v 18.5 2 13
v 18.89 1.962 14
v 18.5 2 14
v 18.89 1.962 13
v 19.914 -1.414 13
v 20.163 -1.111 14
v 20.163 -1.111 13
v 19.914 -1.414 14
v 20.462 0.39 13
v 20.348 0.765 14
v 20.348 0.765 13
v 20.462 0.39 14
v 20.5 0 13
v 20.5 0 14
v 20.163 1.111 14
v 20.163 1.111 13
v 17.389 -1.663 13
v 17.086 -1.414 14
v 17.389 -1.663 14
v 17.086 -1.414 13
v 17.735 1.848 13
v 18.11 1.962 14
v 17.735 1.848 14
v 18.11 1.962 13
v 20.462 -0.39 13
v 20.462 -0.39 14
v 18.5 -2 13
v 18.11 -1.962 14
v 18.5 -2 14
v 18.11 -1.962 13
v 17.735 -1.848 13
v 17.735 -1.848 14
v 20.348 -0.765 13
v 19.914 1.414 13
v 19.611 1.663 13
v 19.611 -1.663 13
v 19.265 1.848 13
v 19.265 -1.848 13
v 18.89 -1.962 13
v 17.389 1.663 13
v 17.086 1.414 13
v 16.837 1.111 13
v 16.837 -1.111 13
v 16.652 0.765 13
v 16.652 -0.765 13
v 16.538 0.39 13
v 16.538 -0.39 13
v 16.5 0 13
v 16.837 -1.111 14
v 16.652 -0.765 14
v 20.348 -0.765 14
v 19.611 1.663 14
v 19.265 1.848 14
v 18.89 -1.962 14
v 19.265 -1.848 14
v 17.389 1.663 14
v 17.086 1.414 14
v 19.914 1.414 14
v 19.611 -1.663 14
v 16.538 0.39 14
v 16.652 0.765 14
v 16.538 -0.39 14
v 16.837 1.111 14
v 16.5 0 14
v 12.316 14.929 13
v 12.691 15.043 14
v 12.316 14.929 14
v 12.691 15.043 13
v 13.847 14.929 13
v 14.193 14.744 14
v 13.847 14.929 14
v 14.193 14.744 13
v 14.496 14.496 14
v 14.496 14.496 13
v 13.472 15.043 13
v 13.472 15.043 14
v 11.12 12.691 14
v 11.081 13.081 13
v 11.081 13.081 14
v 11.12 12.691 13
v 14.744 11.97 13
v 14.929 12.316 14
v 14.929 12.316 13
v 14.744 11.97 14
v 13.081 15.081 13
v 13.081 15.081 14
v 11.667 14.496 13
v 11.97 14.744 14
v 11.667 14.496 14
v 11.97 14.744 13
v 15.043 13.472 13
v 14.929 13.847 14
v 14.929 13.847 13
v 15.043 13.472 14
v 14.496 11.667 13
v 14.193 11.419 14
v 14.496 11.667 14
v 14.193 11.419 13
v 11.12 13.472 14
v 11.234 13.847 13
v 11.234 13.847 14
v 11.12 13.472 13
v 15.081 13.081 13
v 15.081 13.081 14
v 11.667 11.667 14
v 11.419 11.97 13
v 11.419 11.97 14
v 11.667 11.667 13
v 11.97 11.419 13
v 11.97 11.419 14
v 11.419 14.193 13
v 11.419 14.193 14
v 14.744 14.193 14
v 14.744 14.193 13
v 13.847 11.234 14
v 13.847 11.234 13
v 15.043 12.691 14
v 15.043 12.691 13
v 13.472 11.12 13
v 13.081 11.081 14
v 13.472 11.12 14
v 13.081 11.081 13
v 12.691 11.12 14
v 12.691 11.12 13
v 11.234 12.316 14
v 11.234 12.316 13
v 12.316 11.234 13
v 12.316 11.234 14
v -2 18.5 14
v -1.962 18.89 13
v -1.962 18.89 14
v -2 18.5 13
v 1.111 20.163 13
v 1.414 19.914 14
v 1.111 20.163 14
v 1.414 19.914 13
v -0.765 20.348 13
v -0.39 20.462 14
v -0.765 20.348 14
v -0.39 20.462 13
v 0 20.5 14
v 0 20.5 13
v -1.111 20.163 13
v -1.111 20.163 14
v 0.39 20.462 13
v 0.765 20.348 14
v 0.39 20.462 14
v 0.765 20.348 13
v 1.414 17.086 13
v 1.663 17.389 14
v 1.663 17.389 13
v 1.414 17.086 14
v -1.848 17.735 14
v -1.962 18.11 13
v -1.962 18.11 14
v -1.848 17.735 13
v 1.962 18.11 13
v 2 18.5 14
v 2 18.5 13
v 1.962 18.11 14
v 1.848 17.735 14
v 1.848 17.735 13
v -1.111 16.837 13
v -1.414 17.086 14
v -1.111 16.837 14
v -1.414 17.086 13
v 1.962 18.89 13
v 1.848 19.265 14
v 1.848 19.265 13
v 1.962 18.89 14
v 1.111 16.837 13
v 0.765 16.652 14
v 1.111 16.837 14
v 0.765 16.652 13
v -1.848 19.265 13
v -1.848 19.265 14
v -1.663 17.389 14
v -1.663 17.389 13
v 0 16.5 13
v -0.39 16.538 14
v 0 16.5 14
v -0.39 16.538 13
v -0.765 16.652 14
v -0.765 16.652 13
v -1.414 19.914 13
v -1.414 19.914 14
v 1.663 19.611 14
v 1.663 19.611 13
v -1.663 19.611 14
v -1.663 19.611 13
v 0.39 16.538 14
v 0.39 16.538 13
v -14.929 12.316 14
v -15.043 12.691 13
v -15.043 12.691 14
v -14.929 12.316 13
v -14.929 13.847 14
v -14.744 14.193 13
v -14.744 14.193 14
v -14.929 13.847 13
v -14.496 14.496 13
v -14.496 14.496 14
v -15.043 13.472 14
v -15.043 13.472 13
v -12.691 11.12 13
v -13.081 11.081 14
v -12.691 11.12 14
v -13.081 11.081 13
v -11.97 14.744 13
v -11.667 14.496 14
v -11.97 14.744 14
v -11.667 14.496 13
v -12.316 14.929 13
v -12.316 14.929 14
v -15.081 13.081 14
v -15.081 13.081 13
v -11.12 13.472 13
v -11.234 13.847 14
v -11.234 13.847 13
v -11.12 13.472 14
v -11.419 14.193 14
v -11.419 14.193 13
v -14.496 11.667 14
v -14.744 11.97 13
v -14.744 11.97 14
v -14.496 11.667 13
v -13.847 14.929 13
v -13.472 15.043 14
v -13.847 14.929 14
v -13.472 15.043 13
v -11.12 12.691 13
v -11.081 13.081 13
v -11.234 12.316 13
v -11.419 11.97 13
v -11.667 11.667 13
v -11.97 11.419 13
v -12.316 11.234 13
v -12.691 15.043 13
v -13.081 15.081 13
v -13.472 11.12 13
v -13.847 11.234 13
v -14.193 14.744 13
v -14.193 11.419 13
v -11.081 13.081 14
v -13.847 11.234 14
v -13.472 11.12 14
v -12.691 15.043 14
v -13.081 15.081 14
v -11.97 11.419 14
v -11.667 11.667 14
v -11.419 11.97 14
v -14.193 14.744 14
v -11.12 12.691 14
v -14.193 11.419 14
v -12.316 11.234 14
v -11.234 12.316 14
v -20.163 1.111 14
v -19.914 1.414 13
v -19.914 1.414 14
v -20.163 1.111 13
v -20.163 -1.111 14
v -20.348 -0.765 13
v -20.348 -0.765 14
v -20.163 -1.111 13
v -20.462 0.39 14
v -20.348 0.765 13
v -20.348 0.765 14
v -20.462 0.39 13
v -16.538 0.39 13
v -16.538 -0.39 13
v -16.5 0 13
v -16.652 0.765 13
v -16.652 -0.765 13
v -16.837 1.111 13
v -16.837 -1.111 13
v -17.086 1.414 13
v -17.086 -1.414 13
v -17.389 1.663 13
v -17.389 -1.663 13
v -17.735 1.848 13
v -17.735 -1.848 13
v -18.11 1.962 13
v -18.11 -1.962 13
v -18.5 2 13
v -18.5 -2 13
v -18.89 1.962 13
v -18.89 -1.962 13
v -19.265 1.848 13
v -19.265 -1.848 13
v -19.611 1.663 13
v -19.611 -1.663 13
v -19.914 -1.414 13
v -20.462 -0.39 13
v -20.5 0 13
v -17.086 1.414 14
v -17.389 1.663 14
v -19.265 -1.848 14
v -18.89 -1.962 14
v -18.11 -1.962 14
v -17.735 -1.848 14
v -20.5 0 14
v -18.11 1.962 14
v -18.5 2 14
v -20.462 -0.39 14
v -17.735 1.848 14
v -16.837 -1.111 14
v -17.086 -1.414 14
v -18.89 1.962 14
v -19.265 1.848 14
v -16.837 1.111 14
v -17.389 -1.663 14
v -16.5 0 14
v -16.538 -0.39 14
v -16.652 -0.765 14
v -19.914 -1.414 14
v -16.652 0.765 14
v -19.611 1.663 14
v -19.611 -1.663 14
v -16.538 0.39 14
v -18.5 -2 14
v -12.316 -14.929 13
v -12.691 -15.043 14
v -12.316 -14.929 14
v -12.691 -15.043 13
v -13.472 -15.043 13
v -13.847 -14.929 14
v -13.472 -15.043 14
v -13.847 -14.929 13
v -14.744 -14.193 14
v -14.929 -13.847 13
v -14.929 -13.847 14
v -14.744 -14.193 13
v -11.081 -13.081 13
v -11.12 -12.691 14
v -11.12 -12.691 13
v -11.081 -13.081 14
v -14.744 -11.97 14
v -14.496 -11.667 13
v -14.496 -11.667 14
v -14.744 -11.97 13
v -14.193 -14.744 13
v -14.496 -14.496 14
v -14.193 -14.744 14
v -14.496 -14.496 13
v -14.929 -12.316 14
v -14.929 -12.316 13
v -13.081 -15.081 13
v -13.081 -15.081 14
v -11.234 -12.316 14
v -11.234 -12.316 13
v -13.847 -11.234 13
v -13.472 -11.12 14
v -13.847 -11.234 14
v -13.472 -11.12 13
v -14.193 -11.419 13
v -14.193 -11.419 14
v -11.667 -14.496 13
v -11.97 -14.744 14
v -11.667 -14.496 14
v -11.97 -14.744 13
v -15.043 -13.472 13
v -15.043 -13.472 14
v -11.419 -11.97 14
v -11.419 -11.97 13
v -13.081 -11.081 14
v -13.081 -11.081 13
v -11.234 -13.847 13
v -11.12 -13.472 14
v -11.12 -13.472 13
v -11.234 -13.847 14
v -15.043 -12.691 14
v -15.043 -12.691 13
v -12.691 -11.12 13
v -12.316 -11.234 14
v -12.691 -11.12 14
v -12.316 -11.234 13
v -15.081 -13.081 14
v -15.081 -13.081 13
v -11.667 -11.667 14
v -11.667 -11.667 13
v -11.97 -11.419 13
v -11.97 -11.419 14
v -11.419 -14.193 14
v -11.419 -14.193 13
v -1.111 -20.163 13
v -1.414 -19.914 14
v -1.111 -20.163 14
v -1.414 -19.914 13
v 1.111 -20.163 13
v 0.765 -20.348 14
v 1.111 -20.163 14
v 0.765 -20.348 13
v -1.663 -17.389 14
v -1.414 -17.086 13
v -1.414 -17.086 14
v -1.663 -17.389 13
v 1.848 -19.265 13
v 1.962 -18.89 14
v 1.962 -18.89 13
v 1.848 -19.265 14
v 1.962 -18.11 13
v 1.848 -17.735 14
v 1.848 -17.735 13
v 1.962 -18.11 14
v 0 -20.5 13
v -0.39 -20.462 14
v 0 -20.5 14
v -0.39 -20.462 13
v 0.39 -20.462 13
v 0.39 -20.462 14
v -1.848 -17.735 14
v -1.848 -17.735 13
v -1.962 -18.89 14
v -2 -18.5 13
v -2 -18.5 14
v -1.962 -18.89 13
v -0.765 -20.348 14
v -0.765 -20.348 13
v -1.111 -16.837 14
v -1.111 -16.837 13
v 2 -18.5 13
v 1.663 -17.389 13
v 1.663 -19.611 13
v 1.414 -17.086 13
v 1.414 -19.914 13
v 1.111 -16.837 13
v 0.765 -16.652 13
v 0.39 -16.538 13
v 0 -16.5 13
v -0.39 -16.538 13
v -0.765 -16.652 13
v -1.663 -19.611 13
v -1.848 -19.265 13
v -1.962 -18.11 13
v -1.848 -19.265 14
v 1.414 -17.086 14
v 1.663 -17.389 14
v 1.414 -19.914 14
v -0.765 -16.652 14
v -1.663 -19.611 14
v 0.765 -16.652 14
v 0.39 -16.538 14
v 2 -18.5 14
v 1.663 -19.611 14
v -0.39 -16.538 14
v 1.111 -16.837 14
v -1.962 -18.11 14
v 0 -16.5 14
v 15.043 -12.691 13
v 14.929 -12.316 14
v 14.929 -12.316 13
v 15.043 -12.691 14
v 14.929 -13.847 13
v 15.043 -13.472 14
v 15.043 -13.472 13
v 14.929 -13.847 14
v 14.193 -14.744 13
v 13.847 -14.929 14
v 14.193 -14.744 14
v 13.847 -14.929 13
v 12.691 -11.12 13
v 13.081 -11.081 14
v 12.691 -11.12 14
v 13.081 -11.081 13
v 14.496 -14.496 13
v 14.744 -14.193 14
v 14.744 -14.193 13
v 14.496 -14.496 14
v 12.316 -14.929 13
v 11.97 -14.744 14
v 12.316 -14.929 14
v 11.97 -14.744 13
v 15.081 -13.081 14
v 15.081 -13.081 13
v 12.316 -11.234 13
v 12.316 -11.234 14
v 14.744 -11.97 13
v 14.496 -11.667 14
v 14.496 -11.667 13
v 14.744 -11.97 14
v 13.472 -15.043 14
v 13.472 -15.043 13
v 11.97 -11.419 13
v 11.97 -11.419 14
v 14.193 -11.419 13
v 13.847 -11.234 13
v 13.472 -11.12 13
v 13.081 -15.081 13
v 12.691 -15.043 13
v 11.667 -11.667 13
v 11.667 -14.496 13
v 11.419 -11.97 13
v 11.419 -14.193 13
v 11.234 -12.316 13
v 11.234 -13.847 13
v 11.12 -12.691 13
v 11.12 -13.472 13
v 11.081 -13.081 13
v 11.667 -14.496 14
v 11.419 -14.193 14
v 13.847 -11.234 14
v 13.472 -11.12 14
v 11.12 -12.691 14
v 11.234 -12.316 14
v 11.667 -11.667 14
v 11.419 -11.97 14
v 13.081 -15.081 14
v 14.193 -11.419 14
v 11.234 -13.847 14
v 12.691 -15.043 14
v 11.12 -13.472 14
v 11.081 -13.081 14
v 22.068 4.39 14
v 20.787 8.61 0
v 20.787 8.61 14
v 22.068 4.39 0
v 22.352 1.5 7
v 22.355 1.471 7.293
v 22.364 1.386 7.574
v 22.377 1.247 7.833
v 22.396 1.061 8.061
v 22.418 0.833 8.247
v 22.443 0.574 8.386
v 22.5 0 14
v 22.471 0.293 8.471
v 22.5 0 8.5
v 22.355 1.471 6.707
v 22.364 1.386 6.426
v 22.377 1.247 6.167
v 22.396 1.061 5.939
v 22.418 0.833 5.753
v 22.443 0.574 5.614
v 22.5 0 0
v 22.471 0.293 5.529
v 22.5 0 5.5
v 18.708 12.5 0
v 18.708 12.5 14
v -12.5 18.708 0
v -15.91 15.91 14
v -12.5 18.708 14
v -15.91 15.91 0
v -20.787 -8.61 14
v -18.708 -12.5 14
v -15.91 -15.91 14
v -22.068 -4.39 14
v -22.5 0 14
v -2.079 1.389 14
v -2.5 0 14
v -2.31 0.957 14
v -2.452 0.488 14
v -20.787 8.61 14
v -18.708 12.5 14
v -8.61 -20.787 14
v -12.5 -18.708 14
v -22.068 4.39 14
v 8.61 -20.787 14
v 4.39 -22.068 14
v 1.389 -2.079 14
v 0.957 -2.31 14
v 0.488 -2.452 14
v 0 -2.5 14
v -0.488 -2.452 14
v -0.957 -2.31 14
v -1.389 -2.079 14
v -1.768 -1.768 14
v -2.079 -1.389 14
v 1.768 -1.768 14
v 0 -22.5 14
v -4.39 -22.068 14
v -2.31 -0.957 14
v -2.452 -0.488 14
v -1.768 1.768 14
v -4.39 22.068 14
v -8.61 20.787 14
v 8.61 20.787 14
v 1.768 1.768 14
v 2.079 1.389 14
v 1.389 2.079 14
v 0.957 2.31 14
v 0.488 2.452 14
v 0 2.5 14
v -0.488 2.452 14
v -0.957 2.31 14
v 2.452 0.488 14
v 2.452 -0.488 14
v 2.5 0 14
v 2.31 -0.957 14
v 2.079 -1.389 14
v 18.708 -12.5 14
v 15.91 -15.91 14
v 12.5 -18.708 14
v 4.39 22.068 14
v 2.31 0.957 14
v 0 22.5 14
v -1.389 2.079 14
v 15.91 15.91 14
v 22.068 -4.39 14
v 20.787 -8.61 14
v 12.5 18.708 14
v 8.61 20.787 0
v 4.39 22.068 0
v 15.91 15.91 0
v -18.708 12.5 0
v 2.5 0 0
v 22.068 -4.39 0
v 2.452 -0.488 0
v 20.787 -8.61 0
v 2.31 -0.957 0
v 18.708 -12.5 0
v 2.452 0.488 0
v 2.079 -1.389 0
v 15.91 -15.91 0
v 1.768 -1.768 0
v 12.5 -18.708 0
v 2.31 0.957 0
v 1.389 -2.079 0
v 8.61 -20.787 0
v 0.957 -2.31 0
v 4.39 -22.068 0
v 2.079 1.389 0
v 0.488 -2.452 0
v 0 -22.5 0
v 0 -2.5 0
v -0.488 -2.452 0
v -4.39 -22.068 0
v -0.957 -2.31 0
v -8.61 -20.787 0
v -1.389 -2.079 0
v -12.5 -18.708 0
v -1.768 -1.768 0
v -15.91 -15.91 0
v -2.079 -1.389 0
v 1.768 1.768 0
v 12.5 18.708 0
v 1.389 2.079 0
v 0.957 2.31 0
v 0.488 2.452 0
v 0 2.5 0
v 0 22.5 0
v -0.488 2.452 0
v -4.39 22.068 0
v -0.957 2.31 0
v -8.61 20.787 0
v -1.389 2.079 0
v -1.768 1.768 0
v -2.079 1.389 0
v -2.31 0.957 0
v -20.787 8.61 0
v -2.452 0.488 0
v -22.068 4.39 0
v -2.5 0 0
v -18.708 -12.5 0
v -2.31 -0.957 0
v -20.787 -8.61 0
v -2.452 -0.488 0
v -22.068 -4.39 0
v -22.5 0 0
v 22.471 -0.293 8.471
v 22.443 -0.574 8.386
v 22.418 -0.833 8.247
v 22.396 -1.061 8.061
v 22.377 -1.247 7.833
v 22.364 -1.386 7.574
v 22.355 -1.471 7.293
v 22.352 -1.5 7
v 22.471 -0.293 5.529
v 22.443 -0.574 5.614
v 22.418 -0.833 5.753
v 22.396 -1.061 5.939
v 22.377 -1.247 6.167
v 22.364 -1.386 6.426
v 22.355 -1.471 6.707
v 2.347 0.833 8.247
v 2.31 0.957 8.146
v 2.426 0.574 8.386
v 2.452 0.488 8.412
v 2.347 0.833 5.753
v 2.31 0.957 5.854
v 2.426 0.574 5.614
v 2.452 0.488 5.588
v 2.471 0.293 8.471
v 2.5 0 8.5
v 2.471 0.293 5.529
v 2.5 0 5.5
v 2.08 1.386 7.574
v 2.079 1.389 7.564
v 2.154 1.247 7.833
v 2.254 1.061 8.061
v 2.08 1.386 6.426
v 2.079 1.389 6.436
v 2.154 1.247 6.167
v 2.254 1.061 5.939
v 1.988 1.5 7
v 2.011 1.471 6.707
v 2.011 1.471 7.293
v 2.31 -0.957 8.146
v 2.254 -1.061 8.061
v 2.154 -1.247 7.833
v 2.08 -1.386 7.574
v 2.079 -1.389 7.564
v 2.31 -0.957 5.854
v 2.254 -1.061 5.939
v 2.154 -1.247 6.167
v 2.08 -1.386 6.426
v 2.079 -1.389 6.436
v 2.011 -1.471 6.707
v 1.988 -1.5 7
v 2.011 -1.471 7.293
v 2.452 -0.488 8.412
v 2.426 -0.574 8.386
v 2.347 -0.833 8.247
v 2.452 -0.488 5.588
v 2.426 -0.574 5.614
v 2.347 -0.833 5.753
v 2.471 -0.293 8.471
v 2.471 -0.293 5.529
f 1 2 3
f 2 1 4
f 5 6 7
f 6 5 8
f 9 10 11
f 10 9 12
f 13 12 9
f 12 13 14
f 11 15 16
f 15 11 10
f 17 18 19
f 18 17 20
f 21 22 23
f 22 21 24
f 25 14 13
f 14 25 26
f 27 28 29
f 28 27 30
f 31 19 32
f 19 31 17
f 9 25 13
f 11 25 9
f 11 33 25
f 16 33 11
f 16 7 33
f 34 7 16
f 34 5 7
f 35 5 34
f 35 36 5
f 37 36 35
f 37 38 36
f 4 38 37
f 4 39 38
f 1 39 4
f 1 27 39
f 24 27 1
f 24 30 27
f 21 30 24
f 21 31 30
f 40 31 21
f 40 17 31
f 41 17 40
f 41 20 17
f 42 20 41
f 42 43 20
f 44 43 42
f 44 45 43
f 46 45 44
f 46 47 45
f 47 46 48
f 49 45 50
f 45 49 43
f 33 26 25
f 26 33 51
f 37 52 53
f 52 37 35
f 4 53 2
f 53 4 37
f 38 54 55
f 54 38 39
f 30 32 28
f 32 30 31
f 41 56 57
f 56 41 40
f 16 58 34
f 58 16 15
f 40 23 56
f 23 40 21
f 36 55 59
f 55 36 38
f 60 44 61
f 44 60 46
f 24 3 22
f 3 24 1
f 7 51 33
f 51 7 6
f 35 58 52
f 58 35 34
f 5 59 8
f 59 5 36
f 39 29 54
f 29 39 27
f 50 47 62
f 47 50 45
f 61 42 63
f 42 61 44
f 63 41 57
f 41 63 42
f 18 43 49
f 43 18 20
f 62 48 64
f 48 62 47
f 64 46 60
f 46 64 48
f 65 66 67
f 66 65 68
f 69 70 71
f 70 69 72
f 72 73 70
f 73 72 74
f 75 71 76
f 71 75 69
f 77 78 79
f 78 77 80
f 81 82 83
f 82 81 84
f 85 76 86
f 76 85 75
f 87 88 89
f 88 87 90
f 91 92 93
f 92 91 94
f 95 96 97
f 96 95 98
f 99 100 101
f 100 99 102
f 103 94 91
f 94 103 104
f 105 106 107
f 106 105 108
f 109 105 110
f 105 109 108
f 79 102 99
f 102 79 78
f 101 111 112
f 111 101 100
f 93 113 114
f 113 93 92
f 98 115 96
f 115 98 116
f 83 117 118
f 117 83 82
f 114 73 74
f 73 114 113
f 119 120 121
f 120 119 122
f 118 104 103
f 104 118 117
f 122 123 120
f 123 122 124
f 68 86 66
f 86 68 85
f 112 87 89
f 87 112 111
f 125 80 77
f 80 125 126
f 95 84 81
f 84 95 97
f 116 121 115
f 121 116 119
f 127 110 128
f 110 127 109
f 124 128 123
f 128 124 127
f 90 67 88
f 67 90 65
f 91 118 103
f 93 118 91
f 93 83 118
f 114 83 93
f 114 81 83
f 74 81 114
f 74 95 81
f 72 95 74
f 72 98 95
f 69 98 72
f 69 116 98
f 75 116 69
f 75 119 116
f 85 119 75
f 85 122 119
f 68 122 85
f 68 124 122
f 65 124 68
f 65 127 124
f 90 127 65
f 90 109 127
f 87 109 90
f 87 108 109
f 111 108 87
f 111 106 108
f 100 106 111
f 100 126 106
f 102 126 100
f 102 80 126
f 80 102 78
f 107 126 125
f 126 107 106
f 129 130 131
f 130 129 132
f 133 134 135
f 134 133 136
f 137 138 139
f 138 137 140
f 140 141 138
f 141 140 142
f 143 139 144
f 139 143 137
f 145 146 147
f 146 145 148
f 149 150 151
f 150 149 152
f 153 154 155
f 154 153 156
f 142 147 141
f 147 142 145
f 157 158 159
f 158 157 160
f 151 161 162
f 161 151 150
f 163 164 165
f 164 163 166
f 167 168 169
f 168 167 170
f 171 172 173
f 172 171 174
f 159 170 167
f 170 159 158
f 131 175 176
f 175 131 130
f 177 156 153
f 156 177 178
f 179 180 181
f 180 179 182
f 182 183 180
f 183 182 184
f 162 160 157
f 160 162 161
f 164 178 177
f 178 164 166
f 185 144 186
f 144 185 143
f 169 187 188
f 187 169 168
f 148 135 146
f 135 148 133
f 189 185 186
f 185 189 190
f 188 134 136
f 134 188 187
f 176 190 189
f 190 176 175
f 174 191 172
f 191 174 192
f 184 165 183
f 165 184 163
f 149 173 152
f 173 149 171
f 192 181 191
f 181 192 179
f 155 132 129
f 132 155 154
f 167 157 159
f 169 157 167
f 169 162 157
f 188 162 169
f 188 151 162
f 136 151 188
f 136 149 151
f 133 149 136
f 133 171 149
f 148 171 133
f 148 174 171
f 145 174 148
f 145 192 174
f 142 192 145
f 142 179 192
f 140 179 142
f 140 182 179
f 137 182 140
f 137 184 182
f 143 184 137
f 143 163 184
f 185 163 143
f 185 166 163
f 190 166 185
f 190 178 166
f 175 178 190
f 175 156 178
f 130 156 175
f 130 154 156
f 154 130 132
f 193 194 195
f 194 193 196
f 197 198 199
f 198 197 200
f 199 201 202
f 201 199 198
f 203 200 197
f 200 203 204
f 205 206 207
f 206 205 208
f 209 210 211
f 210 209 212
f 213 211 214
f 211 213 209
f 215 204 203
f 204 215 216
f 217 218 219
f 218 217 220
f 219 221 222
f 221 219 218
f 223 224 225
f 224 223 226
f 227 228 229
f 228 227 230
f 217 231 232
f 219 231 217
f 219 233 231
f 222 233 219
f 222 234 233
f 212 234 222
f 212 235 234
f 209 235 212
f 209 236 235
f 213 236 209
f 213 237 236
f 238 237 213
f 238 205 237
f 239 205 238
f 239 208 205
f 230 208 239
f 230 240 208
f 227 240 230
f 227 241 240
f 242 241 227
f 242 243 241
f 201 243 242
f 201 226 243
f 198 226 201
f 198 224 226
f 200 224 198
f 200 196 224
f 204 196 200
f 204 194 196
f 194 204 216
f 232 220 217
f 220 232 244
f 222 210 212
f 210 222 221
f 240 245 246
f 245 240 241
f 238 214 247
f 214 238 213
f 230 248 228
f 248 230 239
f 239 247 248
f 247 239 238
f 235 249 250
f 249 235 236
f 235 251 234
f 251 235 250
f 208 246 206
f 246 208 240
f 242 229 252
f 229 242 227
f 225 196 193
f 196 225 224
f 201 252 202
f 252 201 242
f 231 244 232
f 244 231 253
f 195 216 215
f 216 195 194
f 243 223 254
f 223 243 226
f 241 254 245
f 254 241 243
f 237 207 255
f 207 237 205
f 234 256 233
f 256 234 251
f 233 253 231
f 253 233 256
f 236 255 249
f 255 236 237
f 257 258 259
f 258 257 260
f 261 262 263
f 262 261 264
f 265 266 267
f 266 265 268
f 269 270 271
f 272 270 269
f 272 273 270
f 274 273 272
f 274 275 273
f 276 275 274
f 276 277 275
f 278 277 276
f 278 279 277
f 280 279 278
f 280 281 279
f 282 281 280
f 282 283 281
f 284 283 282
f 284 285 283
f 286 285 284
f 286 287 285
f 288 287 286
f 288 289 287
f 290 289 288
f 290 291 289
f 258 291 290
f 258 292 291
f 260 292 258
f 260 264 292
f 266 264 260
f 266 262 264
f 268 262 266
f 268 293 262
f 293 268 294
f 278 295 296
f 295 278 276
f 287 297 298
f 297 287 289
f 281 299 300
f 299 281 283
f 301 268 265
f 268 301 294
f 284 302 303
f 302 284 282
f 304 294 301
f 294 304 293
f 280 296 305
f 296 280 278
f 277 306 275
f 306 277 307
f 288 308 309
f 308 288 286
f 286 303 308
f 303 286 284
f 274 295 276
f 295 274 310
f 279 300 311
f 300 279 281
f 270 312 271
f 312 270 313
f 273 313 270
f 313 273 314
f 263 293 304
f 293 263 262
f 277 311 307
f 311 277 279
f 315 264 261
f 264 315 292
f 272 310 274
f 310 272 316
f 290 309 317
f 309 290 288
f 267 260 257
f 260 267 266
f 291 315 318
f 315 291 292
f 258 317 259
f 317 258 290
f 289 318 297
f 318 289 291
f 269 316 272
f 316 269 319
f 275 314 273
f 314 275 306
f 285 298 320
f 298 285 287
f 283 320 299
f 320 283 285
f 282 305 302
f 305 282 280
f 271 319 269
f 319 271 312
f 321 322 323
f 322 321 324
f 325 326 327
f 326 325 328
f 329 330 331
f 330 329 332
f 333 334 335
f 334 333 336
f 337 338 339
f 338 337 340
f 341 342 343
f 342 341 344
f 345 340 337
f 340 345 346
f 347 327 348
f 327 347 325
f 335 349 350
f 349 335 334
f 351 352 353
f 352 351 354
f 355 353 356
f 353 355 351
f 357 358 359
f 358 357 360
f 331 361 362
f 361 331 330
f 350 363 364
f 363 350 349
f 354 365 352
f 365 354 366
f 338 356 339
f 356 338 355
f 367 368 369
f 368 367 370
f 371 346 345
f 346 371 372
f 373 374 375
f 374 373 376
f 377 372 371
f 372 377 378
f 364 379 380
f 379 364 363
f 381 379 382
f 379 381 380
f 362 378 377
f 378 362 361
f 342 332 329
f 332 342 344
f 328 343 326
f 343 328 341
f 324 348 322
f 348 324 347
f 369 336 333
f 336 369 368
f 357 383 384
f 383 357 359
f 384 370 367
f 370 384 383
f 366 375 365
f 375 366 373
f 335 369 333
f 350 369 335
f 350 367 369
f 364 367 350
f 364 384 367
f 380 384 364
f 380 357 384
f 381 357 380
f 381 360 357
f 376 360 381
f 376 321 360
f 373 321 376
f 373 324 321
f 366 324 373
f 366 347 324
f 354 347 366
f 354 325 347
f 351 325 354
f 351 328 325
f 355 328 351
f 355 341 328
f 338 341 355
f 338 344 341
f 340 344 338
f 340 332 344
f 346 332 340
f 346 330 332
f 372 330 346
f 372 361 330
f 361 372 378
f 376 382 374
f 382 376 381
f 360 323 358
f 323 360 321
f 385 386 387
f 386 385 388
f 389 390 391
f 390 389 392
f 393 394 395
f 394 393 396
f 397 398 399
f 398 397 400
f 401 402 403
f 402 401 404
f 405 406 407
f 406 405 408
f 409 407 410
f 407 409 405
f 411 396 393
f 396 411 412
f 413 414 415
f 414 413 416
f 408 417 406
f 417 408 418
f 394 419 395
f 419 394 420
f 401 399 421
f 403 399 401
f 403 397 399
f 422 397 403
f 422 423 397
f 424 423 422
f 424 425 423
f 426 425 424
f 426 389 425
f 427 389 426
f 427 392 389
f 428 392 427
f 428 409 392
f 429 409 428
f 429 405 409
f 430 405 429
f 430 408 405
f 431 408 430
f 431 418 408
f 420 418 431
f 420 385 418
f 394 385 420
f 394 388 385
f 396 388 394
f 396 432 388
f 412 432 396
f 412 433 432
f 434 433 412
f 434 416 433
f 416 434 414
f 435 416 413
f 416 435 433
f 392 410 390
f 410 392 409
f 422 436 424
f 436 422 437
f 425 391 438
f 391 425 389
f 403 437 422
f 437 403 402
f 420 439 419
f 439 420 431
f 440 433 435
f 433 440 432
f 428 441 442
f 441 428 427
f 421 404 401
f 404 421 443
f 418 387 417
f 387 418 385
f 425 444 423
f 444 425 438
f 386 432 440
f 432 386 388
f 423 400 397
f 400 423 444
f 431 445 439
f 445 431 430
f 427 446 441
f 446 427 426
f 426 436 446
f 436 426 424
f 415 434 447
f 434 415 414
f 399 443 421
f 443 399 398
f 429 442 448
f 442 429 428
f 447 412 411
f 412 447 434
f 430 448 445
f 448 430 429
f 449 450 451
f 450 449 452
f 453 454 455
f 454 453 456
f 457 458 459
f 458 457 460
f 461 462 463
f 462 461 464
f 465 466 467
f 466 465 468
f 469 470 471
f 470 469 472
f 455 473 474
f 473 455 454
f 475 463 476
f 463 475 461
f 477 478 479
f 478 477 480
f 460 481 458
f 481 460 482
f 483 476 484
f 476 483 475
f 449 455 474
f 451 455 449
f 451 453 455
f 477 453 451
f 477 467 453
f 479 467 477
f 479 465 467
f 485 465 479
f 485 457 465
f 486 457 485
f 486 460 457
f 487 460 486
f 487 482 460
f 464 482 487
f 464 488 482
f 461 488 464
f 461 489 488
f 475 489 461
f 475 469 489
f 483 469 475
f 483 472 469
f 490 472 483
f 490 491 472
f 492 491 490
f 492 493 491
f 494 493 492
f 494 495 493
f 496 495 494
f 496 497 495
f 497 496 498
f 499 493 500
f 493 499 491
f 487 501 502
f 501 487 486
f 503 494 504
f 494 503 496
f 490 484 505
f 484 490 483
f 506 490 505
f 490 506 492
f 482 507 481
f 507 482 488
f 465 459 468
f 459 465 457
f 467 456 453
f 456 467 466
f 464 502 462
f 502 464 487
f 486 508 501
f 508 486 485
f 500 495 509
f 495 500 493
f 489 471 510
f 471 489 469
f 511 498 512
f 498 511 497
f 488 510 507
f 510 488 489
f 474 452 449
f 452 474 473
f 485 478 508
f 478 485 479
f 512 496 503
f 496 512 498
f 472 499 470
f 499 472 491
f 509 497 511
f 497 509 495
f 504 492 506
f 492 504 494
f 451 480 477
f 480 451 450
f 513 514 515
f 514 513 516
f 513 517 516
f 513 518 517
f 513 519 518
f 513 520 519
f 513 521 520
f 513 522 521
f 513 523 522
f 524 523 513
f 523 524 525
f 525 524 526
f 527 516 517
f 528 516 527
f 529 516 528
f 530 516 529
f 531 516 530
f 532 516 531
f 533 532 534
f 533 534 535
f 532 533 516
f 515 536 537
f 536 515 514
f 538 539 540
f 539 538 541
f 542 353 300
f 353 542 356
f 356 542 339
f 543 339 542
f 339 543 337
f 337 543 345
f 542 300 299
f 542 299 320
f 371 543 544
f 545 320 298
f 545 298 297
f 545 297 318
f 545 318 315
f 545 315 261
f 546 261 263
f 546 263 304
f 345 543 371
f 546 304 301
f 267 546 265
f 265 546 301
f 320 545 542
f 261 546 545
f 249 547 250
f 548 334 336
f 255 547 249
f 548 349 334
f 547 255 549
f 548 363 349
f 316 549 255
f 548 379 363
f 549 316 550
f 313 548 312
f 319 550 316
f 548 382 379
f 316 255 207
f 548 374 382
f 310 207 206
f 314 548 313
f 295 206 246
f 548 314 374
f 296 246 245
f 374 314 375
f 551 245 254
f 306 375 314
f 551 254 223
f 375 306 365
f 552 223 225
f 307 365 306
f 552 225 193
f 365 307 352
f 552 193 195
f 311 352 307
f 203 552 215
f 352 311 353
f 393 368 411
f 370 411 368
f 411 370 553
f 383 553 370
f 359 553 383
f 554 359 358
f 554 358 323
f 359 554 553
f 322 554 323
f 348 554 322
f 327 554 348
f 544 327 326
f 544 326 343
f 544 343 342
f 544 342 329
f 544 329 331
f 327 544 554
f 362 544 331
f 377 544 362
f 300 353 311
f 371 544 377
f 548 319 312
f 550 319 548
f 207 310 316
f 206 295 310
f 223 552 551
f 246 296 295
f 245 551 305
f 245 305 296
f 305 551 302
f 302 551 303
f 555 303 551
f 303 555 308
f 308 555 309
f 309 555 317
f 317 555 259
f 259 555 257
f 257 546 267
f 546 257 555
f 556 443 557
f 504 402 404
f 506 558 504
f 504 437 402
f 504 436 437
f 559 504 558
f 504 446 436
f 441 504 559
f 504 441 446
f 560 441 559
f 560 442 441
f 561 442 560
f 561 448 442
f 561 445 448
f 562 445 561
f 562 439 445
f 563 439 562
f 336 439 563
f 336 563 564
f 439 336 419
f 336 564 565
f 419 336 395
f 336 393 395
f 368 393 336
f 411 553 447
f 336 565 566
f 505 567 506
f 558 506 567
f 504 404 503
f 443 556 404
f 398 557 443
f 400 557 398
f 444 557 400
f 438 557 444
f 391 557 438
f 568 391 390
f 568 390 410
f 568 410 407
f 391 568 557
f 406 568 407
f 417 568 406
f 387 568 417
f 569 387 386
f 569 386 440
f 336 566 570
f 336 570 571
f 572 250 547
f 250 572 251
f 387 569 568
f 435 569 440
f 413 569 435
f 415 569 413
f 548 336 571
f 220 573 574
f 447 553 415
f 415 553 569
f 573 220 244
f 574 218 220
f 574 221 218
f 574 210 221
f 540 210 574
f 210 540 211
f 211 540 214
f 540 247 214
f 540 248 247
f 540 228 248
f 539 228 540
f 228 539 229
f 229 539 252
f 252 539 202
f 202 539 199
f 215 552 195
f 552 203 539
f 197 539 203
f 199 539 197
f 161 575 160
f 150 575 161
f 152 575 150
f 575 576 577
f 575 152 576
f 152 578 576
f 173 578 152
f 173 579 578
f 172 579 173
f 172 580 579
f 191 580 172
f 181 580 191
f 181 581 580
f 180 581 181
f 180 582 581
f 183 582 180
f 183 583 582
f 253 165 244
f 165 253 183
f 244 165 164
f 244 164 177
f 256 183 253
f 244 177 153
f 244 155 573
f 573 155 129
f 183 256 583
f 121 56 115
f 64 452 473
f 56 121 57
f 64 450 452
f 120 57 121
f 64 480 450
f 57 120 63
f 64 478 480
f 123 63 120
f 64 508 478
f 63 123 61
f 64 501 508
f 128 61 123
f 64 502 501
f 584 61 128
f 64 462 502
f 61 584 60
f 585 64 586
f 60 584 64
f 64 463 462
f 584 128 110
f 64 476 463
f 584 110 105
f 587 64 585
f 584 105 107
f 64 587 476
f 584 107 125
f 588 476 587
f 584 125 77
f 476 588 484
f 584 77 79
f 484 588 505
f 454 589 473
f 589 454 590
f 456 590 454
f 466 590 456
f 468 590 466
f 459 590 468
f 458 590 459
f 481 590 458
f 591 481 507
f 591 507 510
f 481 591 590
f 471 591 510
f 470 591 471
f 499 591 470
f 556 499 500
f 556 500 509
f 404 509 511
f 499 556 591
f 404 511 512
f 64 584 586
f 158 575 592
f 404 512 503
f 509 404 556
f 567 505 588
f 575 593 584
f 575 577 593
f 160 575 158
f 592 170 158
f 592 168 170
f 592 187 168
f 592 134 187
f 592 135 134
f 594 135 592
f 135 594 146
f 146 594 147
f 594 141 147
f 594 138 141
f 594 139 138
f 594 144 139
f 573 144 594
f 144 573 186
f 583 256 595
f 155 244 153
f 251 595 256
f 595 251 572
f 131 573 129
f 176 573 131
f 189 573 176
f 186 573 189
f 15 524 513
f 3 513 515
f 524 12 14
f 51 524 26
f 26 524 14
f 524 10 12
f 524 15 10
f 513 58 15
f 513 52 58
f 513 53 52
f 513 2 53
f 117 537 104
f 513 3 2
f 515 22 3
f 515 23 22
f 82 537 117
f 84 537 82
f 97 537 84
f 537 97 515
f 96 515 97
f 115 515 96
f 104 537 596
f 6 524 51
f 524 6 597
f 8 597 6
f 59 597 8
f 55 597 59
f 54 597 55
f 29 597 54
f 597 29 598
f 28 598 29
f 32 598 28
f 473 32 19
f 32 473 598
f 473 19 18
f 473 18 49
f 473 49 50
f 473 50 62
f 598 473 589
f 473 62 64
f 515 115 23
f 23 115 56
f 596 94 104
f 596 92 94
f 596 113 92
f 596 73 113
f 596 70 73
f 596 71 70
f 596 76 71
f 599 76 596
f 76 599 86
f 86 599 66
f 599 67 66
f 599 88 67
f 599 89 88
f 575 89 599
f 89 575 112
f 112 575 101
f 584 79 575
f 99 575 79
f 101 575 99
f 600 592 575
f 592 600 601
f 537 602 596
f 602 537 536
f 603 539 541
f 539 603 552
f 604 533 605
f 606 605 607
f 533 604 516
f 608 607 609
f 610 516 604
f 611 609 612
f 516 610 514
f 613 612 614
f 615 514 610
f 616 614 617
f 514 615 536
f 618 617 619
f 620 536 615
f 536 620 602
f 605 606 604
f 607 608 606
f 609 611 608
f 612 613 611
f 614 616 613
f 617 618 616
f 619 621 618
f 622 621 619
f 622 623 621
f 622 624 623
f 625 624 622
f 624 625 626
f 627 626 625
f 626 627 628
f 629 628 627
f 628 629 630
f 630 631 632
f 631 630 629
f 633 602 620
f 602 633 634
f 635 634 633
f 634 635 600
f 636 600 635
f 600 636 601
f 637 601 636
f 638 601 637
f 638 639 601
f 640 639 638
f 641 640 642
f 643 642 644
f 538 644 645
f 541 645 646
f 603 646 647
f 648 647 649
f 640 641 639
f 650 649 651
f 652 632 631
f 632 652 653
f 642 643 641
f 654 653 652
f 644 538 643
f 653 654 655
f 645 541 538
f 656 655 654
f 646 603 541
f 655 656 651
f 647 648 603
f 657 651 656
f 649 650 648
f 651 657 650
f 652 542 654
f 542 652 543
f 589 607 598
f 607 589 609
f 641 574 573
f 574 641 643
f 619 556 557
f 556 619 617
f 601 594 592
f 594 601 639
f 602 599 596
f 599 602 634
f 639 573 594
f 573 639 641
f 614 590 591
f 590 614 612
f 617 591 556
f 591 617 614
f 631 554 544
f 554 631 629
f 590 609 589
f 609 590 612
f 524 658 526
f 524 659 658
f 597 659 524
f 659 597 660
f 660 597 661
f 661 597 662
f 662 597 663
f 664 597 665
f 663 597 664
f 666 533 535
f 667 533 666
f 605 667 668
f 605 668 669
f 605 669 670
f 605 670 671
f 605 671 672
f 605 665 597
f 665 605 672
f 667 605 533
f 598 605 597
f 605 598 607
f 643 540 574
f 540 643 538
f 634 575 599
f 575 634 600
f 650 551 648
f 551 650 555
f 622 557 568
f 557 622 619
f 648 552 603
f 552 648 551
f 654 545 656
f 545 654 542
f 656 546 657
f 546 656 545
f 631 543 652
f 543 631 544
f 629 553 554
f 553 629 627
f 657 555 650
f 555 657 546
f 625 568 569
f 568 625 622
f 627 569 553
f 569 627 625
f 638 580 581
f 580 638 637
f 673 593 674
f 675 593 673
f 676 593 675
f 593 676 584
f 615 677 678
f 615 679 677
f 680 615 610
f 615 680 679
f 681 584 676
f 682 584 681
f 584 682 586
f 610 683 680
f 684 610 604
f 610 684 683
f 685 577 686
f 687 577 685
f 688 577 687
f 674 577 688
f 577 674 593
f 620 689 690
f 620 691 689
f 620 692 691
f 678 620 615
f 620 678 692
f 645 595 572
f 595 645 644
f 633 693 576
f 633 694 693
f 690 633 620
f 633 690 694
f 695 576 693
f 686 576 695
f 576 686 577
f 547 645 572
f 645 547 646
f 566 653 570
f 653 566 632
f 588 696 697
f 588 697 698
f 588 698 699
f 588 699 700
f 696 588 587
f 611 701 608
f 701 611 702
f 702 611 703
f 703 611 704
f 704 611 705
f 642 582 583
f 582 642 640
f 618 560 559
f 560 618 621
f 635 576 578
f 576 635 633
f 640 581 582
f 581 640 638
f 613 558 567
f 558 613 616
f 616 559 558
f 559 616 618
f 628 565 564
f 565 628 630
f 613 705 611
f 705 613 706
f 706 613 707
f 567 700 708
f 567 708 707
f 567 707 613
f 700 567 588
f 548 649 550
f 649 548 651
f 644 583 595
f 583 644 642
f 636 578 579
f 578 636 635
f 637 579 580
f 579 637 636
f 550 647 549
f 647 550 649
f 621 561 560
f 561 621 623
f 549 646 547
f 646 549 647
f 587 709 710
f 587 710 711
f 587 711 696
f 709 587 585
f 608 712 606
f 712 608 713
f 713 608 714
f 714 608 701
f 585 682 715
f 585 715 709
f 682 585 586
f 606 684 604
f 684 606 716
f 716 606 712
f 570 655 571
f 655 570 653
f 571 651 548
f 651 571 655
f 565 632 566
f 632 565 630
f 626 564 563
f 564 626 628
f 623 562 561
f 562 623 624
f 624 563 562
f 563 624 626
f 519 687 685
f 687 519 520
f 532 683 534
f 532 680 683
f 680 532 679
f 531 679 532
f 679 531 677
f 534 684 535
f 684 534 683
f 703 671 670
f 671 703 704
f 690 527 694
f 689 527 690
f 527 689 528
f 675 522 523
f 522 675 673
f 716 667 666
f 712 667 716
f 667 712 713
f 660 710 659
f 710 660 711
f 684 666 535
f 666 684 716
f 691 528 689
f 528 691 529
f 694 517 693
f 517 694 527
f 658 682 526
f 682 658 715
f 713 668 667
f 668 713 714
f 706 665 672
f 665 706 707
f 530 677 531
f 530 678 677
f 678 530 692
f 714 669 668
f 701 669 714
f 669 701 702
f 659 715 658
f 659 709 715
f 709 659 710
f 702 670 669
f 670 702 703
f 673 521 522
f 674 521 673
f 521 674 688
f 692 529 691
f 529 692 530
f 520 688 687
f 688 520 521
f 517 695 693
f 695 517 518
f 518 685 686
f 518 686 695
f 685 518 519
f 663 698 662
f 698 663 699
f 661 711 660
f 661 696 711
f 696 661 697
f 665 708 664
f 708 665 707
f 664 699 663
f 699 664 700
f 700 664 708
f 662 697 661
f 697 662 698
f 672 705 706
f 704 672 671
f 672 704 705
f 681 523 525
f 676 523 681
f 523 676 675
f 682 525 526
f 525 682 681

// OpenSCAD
$fn = 32;

// ----------------------------------------------------------------------
// Control knob: dimpled knob
// ----------------------------------------------------------------------

// --- parameters (mm) ---
dimp_d = 4;               // finger dimple diameter
n_dimp = 8;               // number of dimples
dimp_r = 18.5;            // dimple ring radius
knob_d = 45;              // knob body diameter
knob_h = 14;              // knob body height
bore_d = 5;               // shaft bore diameter
set_d = 3;                // set screw bore diameter
fit_tol = 0.05;           // tolerance for press fits, mm
free_tol = 0.3;           // tolerance for clearance fits, mm

dimp_step = 360 / n_dimp;  // dimple angular step

difference() {
  cylinder(h = knob_h, d = knob_d);
  translate([0, 0, -1]) cylinder(h = knob_h + 2, d = bore_d);
  translate([-1, 0, knob_h / 2]) rotate([0, 90, 0])
    cylinder(h = knob_d / 2 + bore_d / 2 + 2, d = set_d);  for (i = [0 : n_dimp - 1])
    rotate([0, 0, i * dimp_step])
      translate([dimp_r, 0, knob_h - 1])
        cylinder(h = 2, d = dimp_d);
}
